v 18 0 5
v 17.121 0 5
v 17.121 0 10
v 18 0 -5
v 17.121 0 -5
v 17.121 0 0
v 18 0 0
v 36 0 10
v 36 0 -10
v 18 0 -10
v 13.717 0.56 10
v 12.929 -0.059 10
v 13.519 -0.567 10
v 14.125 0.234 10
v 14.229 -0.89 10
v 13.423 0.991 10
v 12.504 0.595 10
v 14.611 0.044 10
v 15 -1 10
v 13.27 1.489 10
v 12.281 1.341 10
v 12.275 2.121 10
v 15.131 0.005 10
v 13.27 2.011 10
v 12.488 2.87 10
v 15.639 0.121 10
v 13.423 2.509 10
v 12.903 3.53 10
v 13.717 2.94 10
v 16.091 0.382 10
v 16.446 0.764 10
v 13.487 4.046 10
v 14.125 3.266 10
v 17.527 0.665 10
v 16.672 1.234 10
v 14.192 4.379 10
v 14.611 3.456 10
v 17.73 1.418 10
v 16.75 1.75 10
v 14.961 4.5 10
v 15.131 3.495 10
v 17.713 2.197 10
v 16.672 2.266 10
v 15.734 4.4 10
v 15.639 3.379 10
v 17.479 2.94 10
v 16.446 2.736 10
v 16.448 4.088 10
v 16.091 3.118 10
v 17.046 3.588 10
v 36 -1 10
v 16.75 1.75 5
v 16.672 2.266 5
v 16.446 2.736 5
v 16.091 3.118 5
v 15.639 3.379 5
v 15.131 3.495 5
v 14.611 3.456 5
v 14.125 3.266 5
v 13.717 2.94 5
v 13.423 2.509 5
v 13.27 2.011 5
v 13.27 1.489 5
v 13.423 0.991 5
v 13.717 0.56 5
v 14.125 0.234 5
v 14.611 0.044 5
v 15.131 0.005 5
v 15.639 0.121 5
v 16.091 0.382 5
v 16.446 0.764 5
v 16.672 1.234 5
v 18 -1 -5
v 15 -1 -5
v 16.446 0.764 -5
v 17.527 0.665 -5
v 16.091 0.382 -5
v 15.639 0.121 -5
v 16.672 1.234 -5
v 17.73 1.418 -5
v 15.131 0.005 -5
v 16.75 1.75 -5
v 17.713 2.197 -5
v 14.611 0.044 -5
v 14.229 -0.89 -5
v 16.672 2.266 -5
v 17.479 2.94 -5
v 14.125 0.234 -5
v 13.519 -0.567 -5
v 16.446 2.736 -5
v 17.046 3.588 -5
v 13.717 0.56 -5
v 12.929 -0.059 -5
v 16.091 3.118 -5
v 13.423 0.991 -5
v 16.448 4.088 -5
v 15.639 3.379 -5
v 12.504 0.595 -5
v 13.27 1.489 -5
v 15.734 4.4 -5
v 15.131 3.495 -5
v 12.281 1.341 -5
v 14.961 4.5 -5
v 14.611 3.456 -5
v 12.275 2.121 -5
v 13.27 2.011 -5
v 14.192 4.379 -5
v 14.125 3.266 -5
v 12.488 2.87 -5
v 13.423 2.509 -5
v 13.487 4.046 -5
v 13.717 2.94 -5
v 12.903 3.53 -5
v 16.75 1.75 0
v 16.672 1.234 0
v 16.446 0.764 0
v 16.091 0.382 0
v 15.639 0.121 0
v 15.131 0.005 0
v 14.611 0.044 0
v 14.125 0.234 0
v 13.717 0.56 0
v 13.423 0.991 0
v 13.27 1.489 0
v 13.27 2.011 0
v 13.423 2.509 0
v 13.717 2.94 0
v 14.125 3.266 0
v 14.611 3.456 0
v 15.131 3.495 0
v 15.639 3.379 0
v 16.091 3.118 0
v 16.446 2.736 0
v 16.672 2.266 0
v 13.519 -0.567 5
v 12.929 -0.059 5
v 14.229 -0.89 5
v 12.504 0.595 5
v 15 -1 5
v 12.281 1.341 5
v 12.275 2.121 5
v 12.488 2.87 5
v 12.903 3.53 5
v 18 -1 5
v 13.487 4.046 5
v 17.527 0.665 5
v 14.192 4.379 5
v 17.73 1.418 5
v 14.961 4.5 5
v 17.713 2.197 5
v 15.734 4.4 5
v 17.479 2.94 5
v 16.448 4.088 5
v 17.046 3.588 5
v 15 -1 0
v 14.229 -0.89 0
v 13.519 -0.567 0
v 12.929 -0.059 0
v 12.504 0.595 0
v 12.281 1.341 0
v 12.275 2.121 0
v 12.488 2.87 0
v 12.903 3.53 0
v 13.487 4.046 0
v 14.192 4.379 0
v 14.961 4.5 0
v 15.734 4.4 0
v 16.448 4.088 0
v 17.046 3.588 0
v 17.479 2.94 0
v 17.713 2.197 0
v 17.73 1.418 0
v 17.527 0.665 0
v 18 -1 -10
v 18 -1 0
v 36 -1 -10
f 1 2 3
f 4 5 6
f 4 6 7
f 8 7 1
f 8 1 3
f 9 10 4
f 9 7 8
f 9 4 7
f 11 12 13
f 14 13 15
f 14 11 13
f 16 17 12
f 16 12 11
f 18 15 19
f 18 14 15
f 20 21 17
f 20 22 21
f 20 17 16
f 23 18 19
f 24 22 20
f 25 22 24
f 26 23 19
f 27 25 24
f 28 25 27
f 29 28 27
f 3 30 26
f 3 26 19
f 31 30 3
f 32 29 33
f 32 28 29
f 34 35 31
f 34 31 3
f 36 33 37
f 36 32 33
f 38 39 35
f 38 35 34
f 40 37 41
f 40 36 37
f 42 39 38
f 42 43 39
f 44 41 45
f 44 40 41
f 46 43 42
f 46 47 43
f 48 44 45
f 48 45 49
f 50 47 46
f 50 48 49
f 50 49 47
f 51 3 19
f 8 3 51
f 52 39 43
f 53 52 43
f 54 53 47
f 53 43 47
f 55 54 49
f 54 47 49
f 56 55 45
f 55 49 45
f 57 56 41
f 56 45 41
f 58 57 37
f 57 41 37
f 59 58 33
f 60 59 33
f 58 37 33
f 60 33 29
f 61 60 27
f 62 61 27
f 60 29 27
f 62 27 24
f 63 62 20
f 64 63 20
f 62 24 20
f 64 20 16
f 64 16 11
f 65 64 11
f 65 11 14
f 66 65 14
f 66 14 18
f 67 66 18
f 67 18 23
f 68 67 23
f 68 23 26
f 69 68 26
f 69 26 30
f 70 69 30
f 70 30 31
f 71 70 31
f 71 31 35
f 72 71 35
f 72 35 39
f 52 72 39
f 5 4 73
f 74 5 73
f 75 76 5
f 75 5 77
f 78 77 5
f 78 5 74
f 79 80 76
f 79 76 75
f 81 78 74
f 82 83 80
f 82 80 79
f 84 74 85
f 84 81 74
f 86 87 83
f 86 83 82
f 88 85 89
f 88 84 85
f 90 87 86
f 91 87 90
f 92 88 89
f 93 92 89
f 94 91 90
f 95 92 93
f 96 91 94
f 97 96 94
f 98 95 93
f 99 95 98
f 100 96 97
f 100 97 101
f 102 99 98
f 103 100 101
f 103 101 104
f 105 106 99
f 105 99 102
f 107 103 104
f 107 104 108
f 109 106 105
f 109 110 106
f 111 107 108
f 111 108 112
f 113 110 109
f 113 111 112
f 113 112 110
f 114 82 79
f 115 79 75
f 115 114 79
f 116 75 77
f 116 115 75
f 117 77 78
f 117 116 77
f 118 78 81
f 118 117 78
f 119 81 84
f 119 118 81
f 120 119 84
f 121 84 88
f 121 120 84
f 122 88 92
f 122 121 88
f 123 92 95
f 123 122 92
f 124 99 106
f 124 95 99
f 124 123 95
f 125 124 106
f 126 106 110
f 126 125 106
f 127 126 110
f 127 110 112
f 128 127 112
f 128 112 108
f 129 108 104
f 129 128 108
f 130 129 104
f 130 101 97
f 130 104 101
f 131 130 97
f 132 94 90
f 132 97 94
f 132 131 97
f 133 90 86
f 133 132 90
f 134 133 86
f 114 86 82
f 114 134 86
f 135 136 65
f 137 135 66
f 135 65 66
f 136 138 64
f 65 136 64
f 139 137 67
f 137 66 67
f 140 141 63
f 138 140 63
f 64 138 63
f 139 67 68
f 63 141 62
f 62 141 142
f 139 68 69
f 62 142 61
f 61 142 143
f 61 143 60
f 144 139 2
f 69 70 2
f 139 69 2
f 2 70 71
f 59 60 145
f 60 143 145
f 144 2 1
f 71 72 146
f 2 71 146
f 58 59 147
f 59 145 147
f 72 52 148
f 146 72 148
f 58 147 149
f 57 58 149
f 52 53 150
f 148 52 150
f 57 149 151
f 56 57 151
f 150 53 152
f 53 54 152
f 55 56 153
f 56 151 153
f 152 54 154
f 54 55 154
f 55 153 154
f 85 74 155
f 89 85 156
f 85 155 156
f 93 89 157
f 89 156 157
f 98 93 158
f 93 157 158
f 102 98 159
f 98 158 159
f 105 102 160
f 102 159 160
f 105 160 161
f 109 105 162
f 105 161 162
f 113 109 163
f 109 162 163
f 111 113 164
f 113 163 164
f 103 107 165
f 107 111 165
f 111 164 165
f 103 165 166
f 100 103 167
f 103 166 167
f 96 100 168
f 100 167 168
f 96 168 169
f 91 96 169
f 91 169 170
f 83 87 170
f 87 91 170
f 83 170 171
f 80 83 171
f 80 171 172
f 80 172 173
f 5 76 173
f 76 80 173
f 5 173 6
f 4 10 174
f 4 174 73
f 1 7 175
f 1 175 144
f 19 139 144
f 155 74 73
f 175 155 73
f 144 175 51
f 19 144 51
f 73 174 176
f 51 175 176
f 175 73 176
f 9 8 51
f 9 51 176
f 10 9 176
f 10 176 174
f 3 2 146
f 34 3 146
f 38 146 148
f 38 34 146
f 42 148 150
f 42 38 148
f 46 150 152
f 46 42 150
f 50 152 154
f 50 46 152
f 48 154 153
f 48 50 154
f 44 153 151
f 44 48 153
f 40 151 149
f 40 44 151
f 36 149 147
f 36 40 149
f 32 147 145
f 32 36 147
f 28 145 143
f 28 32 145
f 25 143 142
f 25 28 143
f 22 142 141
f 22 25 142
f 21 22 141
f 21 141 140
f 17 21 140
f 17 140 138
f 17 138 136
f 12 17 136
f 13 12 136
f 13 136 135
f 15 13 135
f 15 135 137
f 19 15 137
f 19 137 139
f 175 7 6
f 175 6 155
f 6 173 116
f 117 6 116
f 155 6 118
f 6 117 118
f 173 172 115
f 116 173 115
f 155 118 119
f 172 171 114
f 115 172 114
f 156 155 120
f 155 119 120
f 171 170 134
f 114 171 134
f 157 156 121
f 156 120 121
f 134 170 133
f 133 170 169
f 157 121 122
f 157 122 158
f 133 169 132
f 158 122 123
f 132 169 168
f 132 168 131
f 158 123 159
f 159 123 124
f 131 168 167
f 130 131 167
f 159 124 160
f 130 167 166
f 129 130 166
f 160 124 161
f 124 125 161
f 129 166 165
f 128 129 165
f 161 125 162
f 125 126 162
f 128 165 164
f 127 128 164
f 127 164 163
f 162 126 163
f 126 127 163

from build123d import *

# Parameters (mm, degrees)
BOSS_EXTRUDE1_DEPTH = 1
SKETCH2_R           = 2.75
SKETCH2_R_2         = 1.75
BOSS_EXTRUDE2_DEPTH = 5
BOSS_EXTRUDE3_START = -5
SKETCH3_R           = 2.75
SKETCH3_R_2         = 1.75
BOSS_EXTRUDE3_DEPTH = 5


with BuildPart() as part:
    # Sketch1 → Boss-Extrude1 (new body)
    with BuildSketch(Plane(origin=(0, 0, 0), x_dir=(1, 0, 0), z_dir=(0, 1, 0))):
        Polygon((18, 10), (18, 5), (15, 5), (15, 0), (18, 0), (18, -5), (15, -5), (15, -10), (36, -10), (36, 10), align=None)
    extrude(amount=-BOSS_EXTRUDE1_DEPTH)

    # Sketch2 → Boss-Extrude2 (add)
    with BuildSketch(Plane.XY.offset(10)):
        with Locations((15, 1.75)):
            Circle(SKETCH2_R)
        with Locations((15, 1.75)):
            Circle(SKETCH2_R_2, mode=Mode.SUBTRACT)
    extrude(amount=-BOSS_EXTRUDE2_DEPTH)

    # Sketch3 → Boss-Extrude3 (add)
    with BuildSketch(Plane(origin=(0, 0, -5), x_dir=(-1, 0, 0), z_dir=(0, 0, -1)).offset(BOSS_EXTRUDE3_START)):
        with Locations((-15, 1.75)):
            Circle(SKETCH3_R)
        with Locations(Location((-15, 1.75, 0), (0, 0, 180))):
            Circle(SKETCH3_R_2, mode=Mode.SUBTRACT)
    extrude(amount=BOSS_EXTRUDE3_DEPTH)


solid = part.part
